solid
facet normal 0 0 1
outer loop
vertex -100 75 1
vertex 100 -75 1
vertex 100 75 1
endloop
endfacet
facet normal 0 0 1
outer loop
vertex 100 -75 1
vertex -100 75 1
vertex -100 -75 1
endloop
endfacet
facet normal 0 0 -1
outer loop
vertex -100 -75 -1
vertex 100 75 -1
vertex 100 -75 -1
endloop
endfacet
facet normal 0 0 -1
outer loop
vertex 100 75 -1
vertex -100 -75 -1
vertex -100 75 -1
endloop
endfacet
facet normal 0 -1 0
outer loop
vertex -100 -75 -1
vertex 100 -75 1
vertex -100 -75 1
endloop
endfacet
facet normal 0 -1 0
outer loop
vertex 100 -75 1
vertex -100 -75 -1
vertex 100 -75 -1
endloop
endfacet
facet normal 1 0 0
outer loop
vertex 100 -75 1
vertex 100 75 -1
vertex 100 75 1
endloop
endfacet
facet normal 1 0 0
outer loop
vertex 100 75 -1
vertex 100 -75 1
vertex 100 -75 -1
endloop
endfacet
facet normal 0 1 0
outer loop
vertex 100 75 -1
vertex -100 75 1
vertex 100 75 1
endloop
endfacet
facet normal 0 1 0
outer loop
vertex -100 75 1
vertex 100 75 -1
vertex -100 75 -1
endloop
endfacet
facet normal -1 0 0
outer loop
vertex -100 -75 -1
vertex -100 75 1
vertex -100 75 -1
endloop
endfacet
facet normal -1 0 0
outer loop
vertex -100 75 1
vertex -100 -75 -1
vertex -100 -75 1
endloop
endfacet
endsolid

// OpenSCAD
// A generic sheet (single connected solid)

// Parameters
sheet_length = 200;      //[100:400:1]
sheet_width  = 150;      //[75:300:1]
sheet_thickness = 2;     //[1:6:0.5]

// Ensure non-zero, renderable thickness
min_th = 0.5;
t = max(sheet_thickness, min_th);

// Sheet
color("Silver")
cube([sheet_length, sheet_width, t], center=true);
